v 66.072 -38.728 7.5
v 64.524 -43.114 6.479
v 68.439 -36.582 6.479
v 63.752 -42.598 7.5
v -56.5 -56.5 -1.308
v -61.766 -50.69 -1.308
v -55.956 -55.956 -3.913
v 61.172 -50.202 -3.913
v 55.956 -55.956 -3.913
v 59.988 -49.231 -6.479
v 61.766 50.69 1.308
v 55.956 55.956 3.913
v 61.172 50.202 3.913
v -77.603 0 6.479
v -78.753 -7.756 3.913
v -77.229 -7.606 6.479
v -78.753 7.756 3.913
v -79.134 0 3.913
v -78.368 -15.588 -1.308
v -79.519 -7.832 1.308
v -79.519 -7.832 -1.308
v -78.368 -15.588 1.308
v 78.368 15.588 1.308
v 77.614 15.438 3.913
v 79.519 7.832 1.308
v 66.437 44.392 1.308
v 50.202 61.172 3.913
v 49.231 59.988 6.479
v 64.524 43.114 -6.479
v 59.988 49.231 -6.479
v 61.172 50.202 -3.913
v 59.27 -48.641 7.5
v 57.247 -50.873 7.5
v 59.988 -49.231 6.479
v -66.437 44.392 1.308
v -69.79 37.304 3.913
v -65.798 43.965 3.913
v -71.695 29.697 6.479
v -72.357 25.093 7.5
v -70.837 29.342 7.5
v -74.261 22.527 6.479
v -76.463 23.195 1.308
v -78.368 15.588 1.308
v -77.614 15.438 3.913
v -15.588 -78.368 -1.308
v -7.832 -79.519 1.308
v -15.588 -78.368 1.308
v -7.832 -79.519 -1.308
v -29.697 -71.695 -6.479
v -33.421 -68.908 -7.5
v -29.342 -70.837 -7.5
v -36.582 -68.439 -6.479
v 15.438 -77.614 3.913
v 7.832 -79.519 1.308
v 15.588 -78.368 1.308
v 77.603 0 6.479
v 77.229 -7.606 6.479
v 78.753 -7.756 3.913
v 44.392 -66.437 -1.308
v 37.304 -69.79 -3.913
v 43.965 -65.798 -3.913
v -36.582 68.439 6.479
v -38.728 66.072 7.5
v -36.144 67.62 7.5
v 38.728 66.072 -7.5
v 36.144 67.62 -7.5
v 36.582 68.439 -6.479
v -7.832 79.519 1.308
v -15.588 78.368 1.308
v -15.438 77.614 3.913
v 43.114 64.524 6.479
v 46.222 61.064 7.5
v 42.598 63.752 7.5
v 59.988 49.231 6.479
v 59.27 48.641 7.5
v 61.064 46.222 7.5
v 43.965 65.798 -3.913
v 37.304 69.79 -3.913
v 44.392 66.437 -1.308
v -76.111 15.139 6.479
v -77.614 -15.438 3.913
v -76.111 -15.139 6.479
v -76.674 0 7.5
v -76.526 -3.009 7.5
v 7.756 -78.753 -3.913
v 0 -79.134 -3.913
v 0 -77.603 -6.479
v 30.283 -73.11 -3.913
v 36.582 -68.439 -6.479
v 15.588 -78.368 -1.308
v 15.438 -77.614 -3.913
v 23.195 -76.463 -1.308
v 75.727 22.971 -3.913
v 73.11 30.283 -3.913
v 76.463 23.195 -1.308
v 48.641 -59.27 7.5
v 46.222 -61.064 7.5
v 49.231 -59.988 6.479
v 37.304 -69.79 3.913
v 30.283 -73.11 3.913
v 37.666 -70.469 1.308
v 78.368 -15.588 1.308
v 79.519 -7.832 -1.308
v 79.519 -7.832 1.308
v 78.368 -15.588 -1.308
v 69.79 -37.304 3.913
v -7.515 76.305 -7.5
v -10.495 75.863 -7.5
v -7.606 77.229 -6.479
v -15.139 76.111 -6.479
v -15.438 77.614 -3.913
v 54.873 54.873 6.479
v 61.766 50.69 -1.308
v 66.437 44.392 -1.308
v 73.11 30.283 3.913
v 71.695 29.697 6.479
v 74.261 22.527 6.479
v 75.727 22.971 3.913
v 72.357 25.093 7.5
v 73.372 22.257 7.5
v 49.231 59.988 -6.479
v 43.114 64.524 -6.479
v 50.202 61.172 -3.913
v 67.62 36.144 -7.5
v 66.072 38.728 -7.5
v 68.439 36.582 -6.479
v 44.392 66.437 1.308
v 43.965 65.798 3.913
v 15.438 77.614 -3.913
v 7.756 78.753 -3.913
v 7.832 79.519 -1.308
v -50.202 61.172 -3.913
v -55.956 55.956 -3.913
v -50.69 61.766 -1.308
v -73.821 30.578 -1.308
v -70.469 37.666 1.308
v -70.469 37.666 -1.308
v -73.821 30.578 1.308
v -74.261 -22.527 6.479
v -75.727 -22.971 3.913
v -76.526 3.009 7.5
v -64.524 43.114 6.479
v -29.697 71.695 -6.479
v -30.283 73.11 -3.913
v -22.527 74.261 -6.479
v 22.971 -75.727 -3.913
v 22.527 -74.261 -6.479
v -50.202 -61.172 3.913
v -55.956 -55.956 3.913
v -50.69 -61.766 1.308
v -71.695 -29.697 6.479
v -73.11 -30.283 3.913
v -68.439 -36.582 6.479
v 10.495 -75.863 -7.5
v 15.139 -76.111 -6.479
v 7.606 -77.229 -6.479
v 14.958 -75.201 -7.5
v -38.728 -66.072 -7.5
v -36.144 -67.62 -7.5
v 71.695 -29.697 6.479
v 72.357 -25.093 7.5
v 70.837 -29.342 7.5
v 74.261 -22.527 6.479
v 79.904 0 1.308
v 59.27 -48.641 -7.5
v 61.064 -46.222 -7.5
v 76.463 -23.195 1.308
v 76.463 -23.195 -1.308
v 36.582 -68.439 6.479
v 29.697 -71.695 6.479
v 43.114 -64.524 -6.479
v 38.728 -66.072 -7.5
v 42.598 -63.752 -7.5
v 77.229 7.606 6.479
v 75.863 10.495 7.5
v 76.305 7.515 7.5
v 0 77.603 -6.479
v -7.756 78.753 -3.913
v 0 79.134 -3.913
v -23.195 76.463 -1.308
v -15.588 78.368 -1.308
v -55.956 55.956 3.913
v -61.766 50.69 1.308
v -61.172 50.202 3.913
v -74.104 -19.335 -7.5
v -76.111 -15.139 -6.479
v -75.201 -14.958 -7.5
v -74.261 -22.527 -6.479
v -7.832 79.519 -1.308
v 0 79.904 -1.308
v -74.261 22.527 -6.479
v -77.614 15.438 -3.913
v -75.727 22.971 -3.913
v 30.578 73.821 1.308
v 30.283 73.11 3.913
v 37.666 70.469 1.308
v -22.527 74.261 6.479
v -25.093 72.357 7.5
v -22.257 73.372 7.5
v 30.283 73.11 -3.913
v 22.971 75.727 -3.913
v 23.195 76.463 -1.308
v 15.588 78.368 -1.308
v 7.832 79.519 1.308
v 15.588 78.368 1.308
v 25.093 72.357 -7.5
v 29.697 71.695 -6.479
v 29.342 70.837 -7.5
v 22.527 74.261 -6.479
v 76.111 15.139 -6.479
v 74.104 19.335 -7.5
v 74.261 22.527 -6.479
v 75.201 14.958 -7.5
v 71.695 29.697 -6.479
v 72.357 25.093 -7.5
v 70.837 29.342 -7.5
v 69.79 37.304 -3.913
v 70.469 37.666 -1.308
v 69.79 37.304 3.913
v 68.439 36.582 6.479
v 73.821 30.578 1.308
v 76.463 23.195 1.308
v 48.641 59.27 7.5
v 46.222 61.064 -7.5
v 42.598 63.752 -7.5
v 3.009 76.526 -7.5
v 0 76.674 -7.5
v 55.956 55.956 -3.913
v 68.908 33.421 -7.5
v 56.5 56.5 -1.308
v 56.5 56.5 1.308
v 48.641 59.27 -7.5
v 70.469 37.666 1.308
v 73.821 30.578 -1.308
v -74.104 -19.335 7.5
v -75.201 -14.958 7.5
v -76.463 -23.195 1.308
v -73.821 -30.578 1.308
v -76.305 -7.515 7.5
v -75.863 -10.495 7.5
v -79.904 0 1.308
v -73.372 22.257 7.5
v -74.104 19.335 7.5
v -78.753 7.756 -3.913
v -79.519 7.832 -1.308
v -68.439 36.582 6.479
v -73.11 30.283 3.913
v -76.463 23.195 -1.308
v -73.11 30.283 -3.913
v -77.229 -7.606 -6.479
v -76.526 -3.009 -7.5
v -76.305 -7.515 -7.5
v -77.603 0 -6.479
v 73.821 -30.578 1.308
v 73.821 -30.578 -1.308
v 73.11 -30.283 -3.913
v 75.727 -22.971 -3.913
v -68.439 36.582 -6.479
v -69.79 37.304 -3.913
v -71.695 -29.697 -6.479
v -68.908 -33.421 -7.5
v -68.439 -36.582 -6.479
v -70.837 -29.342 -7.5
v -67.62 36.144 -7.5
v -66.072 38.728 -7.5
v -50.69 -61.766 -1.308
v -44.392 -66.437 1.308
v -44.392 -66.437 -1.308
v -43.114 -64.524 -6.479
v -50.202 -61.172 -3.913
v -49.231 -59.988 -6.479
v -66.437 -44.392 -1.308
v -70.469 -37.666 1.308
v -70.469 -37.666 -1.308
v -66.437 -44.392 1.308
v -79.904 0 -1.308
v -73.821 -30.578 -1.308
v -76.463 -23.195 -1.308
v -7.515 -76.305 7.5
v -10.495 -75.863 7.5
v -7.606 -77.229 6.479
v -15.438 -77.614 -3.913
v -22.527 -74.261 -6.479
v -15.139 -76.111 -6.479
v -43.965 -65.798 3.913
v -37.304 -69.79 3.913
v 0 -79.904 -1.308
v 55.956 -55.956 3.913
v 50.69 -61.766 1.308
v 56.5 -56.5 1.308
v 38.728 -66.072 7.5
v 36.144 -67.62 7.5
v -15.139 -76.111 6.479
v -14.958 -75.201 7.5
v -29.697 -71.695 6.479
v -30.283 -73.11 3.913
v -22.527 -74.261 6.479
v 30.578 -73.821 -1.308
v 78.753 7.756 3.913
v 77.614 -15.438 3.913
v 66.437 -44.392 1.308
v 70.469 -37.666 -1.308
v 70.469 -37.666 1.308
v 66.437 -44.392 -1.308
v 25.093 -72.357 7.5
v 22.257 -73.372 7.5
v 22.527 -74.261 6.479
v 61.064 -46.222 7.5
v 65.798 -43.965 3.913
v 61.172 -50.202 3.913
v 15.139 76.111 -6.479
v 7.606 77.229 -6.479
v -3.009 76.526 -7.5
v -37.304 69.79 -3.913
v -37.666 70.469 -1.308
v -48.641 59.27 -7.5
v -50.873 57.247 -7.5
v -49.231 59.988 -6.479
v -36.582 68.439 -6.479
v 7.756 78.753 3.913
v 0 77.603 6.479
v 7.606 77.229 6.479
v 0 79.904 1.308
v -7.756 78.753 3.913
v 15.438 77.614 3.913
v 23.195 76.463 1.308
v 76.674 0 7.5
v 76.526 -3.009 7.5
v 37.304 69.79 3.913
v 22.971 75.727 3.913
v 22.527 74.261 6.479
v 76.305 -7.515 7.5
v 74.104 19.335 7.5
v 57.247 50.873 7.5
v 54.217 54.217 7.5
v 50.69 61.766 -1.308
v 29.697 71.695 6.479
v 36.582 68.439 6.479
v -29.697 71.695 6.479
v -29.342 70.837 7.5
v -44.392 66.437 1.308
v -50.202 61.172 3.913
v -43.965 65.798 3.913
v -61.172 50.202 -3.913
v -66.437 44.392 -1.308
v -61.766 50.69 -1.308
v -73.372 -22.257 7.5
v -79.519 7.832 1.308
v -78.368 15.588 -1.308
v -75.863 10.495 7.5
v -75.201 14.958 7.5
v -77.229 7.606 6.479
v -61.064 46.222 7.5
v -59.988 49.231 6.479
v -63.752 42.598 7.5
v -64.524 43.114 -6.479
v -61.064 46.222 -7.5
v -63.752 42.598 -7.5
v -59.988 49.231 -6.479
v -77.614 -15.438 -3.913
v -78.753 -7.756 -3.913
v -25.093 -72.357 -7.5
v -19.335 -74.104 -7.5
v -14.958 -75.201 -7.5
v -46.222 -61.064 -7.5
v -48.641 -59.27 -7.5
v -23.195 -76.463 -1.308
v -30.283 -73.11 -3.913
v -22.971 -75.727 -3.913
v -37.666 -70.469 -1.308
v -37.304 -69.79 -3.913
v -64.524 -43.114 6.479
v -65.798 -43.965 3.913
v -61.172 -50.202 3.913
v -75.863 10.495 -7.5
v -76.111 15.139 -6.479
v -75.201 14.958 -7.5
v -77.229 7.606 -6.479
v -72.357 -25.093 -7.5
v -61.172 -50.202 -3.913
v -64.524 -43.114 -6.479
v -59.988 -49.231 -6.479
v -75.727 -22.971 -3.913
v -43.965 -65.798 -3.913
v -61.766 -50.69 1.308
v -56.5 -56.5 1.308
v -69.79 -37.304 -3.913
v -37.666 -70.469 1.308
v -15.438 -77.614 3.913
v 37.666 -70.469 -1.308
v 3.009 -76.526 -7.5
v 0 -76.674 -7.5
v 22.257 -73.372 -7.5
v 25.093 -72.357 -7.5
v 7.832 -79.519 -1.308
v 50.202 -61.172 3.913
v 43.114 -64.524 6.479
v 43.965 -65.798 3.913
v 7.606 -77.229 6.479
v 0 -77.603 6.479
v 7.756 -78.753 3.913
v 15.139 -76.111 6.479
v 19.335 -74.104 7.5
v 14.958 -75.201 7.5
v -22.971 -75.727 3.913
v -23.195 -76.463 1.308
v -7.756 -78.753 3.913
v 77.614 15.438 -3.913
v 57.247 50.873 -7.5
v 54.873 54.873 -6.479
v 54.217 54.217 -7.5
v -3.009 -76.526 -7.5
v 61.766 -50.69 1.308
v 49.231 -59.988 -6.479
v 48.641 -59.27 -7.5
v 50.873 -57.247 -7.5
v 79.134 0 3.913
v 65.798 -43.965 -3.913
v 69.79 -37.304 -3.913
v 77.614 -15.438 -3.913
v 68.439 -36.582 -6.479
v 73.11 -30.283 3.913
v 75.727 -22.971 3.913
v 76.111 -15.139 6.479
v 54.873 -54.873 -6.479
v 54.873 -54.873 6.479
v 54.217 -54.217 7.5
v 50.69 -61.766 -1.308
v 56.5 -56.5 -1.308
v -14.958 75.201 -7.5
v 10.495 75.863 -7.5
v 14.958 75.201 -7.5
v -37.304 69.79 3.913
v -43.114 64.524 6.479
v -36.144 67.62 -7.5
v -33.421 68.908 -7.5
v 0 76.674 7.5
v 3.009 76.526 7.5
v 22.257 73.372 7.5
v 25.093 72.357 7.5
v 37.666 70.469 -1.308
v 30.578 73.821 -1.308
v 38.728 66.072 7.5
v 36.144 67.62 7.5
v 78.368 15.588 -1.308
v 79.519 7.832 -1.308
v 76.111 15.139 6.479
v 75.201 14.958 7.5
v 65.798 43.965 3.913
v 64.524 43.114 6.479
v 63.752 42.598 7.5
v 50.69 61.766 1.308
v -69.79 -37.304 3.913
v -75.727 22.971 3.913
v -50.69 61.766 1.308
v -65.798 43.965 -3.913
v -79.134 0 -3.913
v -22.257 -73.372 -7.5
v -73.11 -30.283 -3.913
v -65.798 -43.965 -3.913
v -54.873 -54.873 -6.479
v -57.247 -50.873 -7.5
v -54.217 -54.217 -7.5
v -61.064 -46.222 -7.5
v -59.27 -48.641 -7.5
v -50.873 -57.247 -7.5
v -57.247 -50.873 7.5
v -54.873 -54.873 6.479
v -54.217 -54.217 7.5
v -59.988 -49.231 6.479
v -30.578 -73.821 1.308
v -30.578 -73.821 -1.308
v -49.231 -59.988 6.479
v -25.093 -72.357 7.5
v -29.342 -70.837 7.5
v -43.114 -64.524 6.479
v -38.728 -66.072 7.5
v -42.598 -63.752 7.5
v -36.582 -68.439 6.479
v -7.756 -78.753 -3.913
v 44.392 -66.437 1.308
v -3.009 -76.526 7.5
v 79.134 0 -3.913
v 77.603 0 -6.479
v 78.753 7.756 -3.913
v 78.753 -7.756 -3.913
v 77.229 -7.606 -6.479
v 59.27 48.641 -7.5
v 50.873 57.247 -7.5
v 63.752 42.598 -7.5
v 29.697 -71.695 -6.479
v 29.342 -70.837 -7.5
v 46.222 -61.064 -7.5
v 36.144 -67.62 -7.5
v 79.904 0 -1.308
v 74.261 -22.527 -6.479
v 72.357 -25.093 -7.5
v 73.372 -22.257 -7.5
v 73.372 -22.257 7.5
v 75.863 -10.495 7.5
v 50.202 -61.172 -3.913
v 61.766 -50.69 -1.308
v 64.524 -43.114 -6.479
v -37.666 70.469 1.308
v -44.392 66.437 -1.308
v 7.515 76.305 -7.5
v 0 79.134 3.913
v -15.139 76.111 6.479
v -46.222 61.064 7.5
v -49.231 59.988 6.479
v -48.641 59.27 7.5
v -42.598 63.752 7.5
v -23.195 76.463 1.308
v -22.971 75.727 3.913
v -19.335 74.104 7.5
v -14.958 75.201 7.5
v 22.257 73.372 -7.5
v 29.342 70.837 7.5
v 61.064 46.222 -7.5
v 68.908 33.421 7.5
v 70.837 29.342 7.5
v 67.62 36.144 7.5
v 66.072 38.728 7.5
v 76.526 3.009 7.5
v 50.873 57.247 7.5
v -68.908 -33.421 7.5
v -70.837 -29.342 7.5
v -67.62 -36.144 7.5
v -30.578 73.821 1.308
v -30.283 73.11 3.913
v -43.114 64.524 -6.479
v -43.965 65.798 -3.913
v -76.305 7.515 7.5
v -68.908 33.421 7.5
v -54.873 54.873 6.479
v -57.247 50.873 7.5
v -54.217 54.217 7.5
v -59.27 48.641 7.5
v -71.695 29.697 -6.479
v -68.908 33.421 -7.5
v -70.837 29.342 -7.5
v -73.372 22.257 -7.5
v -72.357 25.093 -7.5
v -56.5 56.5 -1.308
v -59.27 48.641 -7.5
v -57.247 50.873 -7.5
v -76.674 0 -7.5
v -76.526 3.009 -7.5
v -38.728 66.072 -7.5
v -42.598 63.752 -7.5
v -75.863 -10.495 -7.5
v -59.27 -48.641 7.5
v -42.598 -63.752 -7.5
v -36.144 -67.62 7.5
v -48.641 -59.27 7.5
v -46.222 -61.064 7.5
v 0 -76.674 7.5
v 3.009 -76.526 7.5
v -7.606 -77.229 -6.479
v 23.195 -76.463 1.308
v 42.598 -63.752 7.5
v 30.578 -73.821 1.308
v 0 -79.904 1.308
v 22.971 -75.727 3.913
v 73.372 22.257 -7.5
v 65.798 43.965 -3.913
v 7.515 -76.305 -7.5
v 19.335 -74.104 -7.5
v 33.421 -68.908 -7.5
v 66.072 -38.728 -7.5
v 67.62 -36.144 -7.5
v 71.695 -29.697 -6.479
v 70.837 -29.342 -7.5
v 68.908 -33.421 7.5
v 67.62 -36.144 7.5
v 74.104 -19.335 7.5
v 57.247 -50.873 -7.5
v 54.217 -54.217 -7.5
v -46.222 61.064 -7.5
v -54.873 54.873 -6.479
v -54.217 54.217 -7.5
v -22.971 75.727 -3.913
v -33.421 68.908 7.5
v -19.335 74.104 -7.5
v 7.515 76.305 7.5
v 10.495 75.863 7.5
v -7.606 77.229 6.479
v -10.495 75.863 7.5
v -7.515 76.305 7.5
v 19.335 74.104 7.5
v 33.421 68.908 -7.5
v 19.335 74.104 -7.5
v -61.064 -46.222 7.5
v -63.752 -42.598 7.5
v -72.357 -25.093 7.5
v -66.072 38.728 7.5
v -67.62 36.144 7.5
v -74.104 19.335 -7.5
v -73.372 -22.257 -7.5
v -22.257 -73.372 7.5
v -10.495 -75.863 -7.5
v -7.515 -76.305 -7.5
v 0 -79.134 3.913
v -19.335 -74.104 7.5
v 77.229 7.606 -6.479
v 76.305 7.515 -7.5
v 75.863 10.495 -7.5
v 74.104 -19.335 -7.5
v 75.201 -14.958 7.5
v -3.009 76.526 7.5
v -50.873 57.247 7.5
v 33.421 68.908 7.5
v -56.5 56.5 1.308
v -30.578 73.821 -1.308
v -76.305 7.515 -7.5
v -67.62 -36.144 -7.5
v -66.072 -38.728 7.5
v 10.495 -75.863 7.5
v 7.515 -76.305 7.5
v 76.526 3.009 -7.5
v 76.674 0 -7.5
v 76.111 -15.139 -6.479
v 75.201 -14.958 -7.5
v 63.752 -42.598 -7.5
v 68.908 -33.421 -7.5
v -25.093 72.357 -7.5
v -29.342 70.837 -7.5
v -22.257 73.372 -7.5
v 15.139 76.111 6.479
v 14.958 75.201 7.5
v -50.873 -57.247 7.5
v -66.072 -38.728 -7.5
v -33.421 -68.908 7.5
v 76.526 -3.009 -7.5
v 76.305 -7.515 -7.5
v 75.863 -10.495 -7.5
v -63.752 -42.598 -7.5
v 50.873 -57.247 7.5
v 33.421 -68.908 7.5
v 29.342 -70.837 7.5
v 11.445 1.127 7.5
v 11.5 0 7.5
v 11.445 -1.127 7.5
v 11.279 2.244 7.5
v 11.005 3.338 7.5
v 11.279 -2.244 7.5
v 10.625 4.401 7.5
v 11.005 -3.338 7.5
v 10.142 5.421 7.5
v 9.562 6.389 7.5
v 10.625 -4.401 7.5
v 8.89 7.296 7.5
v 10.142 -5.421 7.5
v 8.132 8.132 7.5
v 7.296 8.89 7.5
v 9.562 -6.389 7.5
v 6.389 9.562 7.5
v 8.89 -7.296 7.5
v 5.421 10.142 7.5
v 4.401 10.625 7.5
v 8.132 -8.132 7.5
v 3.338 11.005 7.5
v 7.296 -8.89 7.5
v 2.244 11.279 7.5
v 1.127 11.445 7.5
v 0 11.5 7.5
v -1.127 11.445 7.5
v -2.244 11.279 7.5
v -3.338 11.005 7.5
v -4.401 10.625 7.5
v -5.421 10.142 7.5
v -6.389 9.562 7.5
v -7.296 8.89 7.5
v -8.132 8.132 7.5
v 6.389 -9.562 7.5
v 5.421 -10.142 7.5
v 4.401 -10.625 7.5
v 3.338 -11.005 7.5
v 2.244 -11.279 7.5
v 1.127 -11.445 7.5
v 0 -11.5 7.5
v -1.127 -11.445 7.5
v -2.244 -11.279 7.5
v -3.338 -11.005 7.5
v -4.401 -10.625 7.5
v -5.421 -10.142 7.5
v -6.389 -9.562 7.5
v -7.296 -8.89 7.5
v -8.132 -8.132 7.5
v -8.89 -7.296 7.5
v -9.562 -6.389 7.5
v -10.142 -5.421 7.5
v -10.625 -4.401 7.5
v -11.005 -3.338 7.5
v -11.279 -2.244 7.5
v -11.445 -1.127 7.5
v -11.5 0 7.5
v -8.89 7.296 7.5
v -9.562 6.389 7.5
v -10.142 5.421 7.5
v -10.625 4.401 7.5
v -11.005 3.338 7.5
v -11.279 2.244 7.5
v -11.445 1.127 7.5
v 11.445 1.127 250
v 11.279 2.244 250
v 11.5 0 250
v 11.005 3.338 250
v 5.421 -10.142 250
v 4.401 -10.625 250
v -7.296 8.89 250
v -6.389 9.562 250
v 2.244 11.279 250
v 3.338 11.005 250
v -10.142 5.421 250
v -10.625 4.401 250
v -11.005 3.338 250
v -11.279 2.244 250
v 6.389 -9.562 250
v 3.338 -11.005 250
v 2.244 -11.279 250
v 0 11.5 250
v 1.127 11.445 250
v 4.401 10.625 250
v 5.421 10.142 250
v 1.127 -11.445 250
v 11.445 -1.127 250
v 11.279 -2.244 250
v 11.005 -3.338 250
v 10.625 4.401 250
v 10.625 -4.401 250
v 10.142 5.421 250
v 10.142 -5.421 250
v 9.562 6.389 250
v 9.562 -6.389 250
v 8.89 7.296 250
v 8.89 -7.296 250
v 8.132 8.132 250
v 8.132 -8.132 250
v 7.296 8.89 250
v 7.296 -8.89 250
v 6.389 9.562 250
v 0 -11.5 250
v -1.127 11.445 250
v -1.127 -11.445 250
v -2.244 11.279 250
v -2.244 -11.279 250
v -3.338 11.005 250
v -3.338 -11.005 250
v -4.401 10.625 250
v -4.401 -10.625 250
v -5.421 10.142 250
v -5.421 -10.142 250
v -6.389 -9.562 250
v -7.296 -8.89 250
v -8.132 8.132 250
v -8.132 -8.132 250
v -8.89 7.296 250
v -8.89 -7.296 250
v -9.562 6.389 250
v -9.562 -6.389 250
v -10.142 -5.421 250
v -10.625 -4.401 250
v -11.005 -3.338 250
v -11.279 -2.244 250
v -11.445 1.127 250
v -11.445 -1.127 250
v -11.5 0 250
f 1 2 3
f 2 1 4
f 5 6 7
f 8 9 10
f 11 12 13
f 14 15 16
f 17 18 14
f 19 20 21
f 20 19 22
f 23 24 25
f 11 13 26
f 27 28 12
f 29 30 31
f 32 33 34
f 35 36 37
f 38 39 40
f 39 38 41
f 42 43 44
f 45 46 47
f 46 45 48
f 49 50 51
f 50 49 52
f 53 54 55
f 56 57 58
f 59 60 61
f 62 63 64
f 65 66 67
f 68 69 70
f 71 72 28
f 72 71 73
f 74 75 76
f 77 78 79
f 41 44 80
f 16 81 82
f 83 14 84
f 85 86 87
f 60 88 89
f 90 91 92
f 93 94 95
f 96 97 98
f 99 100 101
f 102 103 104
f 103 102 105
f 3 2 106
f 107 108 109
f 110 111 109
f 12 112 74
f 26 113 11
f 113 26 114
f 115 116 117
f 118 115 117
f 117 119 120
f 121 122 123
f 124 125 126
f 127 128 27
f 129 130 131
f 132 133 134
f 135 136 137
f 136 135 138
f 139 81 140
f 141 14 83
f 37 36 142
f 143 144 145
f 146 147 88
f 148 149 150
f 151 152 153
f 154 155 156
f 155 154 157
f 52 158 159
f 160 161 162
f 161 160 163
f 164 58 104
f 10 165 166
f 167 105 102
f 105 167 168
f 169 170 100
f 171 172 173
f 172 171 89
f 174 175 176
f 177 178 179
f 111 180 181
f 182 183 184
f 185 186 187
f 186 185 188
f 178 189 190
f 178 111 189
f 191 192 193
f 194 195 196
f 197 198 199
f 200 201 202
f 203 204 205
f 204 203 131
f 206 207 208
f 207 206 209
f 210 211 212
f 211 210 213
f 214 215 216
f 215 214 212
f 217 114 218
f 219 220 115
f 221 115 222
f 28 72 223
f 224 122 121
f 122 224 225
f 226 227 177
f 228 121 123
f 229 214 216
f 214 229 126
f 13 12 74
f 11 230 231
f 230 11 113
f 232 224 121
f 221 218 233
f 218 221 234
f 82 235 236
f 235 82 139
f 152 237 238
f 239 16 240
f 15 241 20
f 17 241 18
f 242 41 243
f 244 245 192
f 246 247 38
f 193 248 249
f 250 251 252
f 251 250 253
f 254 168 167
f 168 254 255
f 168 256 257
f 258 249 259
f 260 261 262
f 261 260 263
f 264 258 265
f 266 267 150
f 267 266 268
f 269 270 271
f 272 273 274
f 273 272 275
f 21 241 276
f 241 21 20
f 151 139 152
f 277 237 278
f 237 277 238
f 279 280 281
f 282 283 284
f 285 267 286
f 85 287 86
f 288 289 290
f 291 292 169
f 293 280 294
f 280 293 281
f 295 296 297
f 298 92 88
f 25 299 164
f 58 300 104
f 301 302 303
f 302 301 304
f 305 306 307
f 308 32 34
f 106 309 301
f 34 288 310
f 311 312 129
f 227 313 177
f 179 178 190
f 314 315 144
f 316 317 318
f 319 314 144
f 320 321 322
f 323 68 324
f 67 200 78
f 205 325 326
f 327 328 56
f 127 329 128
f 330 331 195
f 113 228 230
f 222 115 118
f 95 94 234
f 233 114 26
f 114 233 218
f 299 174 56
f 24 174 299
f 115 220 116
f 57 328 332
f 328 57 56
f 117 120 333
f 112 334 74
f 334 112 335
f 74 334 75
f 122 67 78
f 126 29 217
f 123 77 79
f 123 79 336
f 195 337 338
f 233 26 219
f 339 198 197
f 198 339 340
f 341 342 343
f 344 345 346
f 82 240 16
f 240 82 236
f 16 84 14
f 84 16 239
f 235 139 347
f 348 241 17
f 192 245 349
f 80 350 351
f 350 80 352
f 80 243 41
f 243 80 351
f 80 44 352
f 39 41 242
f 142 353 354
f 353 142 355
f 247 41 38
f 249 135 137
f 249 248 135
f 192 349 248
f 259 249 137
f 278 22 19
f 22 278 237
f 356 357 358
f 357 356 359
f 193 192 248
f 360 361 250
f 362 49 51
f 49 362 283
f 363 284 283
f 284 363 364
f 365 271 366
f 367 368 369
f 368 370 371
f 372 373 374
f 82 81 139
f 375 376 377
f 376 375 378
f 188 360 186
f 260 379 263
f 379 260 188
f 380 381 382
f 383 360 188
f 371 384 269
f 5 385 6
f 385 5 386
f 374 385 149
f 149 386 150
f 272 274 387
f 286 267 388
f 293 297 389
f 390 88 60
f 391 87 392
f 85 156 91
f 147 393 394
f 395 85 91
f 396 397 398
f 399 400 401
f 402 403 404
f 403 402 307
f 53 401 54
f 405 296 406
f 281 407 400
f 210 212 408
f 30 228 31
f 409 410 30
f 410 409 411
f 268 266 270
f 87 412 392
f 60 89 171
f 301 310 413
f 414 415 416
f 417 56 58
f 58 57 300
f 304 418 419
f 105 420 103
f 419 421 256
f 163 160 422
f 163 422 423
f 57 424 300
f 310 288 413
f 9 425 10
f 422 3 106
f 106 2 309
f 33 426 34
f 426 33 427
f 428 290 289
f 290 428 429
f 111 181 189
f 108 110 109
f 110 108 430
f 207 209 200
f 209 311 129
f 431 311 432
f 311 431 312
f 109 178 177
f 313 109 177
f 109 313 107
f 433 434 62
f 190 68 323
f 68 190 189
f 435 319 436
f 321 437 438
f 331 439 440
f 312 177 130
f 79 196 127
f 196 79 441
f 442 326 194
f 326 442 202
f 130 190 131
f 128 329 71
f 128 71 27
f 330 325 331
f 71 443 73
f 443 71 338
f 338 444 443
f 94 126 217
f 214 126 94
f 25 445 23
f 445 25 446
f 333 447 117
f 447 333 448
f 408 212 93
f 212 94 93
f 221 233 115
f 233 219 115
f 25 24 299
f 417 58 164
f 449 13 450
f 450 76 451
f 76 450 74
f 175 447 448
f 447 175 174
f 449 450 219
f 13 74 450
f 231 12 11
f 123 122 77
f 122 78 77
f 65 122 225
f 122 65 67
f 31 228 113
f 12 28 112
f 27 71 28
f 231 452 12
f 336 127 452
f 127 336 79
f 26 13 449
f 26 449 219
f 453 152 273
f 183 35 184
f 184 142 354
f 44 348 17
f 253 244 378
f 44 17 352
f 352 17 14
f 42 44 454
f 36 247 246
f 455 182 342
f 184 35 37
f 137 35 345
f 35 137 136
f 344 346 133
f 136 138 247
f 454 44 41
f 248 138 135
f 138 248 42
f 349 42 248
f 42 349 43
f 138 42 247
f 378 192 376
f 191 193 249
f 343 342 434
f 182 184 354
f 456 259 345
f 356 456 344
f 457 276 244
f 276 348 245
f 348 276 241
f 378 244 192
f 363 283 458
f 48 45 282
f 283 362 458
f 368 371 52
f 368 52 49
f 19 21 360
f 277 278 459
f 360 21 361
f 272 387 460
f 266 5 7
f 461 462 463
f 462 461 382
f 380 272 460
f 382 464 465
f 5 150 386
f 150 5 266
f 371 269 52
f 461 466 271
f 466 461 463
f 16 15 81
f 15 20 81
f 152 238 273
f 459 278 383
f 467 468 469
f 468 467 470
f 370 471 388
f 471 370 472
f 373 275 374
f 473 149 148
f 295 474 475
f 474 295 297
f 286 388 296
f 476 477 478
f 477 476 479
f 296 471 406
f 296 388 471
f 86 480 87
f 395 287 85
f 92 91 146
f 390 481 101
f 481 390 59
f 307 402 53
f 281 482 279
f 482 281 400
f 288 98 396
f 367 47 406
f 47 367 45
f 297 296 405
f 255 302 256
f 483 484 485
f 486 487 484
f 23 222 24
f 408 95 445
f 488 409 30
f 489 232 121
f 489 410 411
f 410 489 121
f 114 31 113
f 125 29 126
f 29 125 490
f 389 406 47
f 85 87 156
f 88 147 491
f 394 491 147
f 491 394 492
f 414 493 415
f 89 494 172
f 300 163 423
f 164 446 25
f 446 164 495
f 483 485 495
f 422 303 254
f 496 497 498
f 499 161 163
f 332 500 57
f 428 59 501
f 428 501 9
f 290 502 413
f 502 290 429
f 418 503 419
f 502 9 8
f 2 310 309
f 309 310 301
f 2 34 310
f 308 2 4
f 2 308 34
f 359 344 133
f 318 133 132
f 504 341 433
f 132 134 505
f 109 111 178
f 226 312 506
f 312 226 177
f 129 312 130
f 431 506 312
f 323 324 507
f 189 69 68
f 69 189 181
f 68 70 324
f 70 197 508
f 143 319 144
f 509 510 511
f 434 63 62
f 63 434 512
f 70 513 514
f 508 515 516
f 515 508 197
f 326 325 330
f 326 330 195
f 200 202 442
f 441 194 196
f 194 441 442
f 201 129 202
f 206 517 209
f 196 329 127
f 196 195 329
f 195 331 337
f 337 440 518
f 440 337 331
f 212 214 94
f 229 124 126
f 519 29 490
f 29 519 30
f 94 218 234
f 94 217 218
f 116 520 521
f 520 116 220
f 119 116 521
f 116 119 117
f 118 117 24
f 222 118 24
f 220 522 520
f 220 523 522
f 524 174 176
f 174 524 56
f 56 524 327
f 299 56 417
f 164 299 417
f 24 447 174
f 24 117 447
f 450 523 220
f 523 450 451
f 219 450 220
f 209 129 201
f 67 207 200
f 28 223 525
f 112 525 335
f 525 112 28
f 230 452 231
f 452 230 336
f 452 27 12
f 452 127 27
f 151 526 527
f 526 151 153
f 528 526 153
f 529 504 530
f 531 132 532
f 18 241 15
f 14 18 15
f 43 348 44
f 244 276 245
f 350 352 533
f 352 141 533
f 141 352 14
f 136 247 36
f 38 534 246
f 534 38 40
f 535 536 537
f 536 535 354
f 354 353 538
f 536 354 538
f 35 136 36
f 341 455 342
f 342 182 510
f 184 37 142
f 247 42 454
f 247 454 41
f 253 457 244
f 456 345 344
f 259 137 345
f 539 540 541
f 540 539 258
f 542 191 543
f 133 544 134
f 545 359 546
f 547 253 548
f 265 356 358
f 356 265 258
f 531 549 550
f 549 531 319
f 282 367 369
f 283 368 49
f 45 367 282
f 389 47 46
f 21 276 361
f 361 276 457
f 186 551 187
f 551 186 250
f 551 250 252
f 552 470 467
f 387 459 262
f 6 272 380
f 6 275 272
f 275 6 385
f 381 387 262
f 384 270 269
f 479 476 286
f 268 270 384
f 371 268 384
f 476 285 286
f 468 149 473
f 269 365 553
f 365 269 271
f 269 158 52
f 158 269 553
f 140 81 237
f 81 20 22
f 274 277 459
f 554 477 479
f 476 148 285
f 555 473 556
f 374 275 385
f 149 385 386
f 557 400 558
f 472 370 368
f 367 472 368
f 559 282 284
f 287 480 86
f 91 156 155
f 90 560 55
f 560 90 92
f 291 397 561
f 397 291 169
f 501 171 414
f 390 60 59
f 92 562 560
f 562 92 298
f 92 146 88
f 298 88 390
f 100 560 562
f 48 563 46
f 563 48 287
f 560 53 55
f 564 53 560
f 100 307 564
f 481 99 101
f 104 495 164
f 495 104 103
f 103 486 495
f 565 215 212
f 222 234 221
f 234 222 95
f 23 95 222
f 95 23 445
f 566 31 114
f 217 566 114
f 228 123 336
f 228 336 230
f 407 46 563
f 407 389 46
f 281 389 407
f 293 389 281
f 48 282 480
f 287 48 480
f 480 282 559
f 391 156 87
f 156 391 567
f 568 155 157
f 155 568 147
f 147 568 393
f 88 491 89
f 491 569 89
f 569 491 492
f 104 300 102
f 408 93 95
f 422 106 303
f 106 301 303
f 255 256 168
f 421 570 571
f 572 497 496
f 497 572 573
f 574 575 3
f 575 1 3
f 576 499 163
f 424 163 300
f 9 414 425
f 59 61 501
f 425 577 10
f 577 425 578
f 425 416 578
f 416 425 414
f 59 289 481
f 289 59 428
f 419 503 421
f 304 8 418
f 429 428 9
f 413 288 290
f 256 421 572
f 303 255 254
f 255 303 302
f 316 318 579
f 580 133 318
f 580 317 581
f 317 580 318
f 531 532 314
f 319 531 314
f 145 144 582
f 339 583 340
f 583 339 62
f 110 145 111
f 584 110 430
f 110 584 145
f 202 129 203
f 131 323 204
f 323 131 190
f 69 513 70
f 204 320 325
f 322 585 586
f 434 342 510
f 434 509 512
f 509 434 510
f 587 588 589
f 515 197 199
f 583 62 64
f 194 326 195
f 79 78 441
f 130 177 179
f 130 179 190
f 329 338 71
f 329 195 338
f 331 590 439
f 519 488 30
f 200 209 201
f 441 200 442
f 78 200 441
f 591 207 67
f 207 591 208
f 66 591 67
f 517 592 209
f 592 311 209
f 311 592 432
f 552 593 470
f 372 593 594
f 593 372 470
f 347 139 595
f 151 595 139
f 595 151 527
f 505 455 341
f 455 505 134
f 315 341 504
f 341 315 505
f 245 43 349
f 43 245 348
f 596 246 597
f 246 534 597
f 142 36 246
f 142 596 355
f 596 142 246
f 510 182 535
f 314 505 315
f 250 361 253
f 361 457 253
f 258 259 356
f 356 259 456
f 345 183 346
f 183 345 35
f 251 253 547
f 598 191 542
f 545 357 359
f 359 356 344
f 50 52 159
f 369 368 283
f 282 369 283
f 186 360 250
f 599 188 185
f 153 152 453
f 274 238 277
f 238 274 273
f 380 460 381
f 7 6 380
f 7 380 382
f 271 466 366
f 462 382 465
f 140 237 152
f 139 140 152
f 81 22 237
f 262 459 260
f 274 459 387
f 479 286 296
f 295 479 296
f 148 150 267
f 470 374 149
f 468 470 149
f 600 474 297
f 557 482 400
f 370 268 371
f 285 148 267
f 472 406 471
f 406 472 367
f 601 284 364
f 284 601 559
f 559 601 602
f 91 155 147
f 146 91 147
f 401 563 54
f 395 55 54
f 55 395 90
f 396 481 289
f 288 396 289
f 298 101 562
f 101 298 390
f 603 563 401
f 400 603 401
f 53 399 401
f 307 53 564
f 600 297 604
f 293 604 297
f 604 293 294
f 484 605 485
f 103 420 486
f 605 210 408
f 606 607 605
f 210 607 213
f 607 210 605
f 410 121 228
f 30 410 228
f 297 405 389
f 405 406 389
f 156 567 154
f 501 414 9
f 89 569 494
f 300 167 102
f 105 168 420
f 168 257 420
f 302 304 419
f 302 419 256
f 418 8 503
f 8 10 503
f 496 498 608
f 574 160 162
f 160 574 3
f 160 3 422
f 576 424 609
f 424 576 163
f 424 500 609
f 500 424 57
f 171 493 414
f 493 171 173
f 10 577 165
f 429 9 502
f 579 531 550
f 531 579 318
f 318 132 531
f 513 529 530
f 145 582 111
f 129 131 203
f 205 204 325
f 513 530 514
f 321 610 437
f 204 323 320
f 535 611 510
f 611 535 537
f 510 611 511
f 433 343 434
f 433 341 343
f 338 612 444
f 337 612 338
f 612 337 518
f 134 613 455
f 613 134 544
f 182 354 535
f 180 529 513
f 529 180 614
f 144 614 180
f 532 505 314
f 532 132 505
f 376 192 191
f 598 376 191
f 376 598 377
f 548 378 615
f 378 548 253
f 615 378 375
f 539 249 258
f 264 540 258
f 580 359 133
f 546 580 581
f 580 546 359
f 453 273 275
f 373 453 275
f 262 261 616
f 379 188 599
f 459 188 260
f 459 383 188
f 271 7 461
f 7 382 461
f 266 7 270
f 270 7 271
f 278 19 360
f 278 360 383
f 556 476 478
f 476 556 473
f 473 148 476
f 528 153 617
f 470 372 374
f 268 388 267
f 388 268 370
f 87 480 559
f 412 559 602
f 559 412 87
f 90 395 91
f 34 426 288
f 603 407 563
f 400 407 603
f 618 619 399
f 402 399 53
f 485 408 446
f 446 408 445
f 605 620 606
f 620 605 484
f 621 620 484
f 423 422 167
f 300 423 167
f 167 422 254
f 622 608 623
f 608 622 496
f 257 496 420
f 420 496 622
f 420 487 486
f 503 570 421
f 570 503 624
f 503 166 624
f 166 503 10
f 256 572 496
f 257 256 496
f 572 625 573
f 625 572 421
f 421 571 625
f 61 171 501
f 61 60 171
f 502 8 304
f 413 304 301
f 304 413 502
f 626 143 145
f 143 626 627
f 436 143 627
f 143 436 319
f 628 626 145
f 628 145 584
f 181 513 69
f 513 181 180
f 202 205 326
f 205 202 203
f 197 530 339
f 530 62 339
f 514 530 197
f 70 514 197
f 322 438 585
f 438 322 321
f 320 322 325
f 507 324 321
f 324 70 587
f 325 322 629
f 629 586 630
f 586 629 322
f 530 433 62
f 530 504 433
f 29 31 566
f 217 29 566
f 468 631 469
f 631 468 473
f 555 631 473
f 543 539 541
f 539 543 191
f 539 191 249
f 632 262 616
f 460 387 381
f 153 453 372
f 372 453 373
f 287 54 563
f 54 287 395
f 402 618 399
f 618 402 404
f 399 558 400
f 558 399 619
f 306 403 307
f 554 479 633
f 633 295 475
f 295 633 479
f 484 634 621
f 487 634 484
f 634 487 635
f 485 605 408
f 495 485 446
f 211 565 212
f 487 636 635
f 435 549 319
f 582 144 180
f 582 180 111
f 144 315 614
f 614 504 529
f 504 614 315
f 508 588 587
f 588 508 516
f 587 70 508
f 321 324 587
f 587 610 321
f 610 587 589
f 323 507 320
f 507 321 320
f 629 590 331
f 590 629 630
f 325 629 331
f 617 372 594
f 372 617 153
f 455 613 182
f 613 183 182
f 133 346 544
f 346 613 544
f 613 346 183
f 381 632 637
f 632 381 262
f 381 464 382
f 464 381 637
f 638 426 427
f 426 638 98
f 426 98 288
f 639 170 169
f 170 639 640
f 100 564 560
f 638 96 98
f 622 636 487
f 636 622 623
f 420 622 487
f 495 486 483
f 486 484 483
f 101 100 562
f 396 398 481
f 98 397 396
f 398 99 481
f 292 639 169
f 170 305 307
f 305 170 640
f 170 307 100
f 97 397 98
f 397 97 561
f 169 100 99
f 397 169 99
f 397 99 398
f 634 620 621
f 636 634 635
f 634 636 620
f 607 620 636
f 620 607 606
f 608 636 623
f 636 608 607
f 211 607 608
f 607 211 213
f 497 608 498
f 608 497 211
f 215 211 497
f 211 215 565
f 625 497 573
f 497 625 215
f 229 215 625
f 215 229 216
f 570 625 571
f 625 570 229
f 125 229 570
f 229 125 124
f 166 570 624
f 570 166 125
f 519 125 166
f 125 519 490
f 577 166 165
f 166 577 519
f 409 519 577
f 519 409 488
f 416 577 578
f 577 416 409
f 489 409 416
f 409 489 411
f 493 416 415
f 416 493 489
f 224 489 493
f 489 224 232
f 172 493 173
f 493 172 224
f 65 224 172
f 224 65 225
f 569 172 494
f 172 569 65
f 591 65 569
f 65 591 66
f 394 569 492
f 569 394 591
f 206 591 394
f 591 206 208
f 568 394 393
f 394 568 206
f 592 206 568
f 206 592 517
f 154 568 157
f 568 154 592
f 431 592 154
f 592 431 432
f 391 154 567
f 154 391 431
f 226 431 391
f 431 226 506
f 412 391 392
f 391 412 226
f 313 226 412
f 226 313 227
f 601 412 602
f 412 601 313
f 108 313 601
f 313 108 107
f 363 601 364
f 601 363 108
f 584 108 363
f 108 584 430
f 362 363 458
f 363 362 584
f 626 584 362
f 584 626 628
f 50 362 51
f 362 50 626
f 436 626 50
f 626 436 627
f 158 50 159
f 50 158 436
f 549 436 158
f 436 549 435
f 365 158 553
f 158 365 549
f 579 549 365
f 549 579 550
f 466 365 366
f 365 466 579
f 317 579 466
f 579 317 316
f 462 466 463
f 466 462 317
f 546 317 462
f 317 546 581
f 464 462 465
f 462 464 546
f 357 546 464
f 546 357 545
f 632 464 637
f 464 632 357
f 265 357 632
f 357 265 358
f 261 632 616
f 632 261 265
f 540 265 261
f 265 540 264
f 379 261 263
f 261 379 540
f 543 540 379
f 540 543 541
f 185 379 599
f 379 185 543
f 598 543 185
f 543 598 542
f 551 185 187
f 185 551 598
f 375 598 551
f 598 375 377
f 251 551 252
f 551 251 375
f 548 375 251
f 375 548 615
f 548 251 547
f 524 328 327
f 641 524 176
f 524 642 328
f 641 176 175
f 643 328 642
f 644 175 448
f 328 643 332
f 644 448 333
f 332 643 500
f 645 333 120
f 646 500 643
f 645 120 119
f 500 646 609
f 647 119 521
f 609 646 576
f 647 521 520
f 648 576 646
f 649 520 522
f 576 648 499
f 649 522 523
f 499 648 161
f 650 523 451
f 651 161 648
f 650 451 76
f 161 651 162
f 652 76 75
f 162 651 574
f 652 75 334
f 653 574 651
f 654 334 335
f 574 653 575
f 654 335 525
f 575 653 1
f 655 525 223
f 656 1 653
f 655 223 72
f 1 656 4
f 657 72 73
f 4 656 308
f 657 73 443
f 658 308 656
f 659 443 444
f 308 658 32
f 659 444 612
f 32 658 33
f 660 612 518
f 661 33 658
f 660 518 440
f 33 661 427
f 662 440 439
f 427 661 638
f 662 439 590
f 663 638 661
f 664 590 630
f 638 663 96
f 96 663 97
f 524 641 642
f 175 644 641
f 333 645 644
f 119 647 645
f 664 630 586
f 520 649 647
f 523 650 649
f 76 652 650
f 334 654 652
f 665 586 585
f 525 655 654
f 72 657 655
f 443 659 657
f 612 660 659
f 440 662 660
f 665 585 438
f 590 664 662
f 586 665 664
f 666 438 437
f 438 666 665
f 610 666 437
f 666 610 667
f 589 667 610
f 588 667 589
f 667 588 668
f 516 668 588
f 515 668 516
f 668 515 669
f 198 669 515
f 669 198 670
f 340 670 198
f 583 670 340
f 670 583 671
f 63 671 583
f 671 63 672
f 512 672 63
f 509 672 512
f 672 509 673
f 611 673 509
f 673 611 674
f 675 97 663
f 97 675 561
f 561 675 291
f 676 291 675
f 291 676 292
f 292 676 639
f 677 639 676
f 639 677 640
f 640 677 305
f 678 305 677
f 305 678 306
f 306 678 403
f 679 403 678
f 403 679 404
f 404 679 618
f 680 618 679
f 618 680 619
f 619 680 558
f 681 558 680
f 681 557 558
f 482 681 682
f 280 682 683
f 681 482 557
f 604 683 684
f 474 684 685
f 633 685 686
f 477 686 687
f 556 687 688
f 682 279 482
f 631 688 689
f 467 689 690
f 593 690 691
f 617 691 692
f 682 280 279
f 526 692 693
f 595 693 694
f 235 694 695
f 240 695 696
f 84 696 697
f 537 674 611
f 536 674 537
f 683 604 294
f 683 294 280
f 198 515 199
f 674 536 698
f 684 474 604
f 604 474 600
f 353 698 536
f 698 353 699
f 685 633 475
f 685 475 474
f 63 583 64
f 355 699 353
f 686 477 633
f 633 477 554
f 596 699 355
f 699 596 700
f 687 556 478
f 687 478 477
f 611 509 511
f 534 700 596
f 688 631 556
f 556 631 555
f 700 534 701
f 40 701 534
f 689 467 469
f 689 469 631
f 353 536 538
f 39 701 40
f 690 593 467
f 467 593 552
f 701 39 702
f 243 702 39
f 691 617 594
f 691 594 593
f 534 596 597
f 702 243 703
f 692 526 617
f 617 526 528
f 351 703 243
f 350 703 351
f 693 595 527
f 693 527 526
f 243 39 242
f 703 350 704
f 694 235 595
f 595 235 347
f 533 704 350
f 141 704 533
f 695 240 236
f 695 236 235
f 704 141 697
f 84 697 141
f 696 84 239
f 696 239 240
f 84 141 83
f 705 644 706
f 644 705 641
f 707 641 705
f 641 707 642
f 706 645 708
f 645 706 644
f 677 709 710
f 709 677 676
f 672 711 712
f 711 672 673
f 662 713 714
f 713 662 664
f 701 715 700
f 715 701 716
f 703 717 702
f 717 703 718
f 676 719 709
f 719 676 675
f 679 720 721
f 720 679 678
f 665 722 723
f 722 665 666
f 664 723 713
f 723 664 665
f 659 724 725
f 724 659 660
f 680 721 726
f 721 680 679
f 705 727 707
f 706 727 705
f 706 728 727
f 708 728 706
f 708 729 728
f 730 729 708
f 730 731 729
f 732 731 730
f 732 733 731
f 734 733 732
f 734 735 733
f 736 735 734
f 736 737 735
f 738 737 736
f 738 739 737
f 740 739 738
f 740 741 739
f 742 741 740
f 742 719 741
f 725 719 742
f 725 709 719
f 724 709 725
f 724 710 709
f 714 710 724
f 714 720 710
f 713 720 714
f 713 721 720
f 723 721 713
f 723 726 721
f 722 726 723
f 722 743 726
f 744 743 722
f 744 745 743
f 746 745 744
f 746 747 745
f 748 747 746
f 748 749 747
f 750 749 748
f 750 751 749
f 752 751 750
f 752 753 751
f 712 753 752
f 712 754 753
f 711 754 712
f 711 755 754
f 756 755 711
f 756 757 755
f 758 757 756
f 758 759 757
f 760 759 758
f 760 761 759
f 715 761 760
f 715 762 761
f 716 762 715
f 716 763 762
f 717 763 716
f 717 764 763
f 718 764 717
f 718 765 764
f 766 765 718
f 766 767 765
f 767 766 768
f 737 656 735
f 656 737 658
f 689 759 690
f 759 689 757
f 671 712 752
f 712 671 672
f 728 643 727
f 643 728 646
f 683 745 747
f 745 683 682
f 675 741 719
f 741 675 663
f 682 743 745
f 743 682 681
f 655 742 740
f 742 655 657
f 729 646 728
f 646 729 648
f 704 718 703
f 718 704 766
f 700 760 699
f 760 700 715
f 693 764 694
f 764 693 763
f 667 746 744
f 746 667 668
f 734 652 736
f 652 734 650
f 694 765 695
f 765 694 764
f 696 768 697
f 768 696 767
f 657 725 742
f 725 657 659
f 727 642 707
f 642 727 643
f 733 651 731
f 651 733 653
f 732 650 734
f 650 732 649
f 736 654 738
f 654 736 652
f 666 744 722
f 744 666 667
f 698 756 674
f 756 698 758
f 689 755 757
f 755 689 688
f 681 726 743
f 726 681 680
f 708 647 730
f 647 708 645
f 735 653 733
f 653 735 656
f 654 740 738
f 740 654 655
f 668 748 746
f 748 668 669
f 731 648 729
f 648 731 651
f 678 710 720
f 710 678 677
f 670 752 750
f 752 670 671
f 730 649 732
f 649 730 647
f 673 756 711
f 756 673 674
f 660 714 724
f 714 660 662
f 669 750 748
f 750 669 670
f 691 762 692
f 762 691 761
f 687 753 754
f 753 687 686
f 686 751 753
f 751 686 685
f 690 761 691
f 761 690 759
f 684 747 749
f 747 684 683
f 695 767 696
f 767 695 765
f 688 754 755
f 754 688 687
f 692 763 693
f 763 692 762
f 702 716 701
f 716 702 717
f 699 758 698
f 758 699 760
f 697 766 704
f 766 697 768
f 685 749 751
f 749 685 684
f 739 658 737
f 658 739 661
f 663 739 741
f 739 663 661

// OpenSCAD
$fn = $preview ? 32 : 64;

base_h = 15;
base_r = 80;
base_scale = [1,1,1/3];
pole_r = 11.5;
pole_h = 250;

intersection() {
    scale(base_scale) {
        sphere(r=base_r);
    }
    translate([0,0,-base_h/2]) {
        cylinder(h=base_h,r=base_r);
    }
}
cylinder(r=pole_r, h=pole_h);
